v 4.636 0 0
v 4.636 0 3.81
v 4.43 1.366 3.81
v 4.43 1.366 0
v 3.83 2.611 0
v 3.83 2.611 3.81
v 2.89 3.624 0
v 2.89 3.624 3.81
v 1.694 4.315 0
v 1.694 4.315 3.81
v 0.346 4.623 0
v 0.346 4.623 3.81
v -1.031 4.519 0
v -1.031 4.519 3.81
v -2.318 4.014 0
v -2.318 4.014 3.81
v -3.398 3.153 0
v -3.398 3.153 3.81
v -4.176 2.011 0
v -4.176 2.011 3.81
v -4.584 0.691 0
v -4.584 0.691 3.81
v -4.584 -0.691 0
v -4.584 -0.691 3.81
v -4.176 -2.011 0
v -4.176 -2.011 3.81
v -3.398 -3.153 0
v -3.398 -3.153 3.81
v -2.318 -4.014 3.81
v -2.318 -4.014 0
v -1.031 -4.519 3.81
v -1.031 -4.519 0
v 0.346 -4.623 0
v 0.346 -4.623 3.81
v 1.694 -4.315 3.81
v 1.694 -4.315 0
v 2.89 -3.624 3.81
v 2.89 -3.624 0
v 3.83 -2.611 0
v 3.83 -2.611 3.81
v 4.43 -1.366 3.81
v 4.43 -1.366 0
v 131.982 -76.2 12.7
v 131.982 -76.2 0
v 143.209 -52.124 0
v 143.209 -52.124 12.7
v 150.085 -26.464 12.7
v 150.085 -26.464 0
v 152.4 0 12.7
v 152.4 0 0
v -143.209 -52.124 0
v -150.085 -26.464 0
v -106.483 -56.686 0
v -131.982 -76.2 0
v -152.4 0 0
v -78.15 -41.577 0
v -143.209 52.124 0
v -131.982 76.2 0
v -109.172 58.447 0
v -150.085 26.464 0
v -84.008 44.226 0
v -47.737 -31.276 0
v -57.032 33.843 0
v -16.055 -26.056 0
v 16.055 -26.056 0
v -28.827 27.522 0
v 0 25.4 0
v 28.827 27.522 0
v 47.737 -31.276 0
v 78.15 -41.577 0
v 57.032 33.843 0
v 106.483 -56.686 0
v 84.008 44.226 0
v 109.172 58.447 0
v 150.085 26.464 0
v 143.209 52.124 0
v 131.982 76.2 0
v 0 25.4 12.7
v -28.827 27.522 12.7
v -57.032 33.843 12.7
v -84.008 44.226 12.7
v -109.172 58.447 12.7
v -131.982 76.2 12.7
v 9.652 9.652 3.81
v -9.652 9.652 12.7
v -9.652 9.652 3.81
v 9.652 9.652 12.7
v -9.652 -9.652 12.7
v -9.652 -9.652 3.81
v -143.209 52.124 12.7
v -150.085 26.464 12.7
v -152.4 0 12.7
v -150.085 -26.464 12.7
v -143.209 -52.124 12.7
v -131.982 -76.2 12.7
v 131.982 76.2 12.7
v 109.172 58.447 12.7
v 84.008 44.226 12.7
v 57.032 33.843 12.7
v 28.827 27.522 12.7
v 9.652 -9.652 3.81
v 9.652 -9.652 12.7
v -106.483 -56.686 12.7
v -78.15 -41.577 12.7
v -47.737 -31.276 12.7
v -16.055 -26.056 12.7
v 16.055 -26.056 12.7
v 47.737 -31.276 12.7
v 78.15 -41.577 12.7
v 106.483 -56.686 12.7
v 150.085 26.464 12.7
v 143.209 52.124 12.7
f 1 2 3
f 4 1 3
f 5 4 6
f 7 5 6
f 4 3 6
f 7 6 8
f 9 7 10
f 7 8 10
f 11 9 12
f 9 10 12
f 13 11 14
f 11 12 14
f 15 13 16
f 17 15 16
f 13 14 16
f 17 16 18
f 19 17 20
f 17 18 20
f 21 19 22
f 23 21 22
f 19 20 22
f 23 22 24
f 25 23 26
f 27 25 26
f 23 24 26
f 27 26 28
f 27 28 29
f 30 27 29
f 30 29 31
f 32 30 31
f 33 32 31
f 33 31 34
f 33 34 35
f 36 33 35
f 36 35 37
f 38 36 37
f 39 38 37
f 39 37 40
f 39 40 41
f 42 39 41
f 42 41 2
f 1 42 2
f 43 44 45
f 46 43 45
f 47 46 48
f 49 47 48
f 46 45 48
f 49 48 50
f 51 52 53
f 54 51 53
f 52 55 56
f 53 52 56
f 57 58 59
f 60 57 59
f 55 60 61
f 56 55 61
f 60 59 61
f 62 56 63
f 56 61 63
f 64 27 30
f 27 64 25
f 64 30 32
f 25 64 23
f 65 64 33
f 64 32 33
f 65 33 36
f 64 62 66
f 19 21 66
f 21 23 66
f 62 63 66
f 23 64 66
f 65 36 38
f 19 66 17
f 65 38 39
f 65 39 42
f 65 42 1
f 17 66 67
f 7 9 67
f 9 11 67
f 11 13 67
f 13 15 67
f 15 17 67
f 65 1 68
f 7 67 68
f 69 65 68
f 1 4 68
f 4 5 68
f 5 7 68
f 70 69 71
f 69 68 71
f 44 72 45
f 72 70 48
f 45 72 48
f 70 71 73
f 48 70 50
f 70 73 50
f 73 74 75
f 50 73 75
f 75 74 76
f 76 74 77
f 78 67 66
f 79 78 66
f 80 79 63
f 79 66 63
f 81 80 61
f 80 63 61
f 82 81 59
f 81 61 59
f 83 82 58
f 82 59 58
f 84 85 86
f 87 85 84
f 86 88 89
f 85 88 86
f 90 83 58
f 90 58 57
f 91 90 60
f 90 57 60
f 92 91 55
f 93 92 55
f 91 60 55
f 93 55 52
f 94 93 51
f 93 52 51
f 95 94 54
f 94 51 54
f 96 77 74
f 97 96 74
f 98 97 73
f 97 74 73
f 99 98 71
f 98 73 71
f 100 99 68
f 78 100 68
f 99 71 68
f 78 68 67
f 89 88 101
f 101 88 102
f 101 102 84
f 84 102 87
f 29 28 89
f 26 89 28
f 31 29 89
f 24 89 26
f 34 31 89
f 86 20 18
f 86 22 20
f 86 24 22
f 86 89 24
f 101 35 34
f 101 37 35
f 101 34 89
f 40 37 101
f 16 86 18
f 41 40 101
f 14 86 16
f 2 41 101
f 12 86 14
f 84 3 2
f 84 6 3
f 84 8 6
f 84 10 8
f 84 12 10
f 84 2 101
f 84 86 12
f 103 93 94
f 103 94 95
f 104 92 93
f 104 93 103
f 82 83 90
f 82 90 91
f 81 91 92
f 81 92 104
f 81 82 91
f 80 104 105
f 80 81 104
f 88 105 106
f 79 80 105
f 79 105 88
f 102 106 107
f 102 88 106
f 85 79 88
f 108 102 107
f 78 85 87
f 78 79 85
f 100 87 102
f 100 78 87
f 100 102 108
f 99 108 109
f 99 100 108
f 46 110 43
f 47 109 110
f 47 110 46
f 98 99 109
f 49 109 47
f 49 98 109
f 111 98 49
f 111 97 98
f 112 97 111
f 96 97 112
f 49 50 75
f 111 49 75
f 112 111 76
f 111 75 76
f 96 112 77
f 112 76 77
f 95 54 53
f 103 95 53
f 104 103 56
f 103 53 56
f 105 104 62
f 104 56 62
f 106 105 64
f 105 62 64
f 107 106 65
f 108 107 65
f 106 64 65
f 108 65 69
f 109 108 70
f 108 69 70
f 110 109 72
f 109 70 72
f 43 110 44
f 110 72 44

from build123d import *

# Parameters (mm, degrees)
F1_DEPTH = 12.7
F2_R     = 4.6355
F3_DEPTH = 12.7
F4_W     = 19.304
F4_H     = 19.304
F4_R     = 4.6355
F5_DEPTH = 8.89


with BuildPart() as f1:
    # F0 (on Top) → F1 (new body)
    with BuildSketch(Plane.XY):
        with BuildLine():
            ThreePointArc((131.9822715367, -76.2), (147.2070959265, -39.4440224736), (152.4, 0))
            ThreePointArc((152.4, 0), (147.2070959265, 39.4440224736), (131.9822715368, 76.2))
            ThreePointArc((131.9822715367, 76.2), (70.7106074079, 38.5384530031), (0, 25.4))
            ThreePointArc((0, 25.4), (-70.7106074079, 38.5384530031), (-131.9822715367, 76.2))
            ThreePointArc((-131.9822715368, 76.2), (-152.4, 0), (-131.9822715367, -76.2))
            ThreePointArc((-131.9822715367, -76.2), (0, -25.4), (131.9822715367, -76.2))
        make_face()
    extrude(amount=F1_DEPTH)

    # F2 (on face) → F3 (cut, through all)
    with BuildSketch(Plane.XY.offset(12.7)):
        Circle(F2_R)
    extrude(amount=-F3_DEPTH, mode=Mode.SUBTRACT)

    # F4 (on face) → F5 (cut)
    with BuildSketch(Plane.XY.offset(12.7)):
        Rectangle(F4_W, F4_H)
        Circle(F4_R, mode=Mode.SUBTRACT)
    extrude(amount=-F5_DEPTH, mode=Mode.SUBTRACT)


solid = f1.part
